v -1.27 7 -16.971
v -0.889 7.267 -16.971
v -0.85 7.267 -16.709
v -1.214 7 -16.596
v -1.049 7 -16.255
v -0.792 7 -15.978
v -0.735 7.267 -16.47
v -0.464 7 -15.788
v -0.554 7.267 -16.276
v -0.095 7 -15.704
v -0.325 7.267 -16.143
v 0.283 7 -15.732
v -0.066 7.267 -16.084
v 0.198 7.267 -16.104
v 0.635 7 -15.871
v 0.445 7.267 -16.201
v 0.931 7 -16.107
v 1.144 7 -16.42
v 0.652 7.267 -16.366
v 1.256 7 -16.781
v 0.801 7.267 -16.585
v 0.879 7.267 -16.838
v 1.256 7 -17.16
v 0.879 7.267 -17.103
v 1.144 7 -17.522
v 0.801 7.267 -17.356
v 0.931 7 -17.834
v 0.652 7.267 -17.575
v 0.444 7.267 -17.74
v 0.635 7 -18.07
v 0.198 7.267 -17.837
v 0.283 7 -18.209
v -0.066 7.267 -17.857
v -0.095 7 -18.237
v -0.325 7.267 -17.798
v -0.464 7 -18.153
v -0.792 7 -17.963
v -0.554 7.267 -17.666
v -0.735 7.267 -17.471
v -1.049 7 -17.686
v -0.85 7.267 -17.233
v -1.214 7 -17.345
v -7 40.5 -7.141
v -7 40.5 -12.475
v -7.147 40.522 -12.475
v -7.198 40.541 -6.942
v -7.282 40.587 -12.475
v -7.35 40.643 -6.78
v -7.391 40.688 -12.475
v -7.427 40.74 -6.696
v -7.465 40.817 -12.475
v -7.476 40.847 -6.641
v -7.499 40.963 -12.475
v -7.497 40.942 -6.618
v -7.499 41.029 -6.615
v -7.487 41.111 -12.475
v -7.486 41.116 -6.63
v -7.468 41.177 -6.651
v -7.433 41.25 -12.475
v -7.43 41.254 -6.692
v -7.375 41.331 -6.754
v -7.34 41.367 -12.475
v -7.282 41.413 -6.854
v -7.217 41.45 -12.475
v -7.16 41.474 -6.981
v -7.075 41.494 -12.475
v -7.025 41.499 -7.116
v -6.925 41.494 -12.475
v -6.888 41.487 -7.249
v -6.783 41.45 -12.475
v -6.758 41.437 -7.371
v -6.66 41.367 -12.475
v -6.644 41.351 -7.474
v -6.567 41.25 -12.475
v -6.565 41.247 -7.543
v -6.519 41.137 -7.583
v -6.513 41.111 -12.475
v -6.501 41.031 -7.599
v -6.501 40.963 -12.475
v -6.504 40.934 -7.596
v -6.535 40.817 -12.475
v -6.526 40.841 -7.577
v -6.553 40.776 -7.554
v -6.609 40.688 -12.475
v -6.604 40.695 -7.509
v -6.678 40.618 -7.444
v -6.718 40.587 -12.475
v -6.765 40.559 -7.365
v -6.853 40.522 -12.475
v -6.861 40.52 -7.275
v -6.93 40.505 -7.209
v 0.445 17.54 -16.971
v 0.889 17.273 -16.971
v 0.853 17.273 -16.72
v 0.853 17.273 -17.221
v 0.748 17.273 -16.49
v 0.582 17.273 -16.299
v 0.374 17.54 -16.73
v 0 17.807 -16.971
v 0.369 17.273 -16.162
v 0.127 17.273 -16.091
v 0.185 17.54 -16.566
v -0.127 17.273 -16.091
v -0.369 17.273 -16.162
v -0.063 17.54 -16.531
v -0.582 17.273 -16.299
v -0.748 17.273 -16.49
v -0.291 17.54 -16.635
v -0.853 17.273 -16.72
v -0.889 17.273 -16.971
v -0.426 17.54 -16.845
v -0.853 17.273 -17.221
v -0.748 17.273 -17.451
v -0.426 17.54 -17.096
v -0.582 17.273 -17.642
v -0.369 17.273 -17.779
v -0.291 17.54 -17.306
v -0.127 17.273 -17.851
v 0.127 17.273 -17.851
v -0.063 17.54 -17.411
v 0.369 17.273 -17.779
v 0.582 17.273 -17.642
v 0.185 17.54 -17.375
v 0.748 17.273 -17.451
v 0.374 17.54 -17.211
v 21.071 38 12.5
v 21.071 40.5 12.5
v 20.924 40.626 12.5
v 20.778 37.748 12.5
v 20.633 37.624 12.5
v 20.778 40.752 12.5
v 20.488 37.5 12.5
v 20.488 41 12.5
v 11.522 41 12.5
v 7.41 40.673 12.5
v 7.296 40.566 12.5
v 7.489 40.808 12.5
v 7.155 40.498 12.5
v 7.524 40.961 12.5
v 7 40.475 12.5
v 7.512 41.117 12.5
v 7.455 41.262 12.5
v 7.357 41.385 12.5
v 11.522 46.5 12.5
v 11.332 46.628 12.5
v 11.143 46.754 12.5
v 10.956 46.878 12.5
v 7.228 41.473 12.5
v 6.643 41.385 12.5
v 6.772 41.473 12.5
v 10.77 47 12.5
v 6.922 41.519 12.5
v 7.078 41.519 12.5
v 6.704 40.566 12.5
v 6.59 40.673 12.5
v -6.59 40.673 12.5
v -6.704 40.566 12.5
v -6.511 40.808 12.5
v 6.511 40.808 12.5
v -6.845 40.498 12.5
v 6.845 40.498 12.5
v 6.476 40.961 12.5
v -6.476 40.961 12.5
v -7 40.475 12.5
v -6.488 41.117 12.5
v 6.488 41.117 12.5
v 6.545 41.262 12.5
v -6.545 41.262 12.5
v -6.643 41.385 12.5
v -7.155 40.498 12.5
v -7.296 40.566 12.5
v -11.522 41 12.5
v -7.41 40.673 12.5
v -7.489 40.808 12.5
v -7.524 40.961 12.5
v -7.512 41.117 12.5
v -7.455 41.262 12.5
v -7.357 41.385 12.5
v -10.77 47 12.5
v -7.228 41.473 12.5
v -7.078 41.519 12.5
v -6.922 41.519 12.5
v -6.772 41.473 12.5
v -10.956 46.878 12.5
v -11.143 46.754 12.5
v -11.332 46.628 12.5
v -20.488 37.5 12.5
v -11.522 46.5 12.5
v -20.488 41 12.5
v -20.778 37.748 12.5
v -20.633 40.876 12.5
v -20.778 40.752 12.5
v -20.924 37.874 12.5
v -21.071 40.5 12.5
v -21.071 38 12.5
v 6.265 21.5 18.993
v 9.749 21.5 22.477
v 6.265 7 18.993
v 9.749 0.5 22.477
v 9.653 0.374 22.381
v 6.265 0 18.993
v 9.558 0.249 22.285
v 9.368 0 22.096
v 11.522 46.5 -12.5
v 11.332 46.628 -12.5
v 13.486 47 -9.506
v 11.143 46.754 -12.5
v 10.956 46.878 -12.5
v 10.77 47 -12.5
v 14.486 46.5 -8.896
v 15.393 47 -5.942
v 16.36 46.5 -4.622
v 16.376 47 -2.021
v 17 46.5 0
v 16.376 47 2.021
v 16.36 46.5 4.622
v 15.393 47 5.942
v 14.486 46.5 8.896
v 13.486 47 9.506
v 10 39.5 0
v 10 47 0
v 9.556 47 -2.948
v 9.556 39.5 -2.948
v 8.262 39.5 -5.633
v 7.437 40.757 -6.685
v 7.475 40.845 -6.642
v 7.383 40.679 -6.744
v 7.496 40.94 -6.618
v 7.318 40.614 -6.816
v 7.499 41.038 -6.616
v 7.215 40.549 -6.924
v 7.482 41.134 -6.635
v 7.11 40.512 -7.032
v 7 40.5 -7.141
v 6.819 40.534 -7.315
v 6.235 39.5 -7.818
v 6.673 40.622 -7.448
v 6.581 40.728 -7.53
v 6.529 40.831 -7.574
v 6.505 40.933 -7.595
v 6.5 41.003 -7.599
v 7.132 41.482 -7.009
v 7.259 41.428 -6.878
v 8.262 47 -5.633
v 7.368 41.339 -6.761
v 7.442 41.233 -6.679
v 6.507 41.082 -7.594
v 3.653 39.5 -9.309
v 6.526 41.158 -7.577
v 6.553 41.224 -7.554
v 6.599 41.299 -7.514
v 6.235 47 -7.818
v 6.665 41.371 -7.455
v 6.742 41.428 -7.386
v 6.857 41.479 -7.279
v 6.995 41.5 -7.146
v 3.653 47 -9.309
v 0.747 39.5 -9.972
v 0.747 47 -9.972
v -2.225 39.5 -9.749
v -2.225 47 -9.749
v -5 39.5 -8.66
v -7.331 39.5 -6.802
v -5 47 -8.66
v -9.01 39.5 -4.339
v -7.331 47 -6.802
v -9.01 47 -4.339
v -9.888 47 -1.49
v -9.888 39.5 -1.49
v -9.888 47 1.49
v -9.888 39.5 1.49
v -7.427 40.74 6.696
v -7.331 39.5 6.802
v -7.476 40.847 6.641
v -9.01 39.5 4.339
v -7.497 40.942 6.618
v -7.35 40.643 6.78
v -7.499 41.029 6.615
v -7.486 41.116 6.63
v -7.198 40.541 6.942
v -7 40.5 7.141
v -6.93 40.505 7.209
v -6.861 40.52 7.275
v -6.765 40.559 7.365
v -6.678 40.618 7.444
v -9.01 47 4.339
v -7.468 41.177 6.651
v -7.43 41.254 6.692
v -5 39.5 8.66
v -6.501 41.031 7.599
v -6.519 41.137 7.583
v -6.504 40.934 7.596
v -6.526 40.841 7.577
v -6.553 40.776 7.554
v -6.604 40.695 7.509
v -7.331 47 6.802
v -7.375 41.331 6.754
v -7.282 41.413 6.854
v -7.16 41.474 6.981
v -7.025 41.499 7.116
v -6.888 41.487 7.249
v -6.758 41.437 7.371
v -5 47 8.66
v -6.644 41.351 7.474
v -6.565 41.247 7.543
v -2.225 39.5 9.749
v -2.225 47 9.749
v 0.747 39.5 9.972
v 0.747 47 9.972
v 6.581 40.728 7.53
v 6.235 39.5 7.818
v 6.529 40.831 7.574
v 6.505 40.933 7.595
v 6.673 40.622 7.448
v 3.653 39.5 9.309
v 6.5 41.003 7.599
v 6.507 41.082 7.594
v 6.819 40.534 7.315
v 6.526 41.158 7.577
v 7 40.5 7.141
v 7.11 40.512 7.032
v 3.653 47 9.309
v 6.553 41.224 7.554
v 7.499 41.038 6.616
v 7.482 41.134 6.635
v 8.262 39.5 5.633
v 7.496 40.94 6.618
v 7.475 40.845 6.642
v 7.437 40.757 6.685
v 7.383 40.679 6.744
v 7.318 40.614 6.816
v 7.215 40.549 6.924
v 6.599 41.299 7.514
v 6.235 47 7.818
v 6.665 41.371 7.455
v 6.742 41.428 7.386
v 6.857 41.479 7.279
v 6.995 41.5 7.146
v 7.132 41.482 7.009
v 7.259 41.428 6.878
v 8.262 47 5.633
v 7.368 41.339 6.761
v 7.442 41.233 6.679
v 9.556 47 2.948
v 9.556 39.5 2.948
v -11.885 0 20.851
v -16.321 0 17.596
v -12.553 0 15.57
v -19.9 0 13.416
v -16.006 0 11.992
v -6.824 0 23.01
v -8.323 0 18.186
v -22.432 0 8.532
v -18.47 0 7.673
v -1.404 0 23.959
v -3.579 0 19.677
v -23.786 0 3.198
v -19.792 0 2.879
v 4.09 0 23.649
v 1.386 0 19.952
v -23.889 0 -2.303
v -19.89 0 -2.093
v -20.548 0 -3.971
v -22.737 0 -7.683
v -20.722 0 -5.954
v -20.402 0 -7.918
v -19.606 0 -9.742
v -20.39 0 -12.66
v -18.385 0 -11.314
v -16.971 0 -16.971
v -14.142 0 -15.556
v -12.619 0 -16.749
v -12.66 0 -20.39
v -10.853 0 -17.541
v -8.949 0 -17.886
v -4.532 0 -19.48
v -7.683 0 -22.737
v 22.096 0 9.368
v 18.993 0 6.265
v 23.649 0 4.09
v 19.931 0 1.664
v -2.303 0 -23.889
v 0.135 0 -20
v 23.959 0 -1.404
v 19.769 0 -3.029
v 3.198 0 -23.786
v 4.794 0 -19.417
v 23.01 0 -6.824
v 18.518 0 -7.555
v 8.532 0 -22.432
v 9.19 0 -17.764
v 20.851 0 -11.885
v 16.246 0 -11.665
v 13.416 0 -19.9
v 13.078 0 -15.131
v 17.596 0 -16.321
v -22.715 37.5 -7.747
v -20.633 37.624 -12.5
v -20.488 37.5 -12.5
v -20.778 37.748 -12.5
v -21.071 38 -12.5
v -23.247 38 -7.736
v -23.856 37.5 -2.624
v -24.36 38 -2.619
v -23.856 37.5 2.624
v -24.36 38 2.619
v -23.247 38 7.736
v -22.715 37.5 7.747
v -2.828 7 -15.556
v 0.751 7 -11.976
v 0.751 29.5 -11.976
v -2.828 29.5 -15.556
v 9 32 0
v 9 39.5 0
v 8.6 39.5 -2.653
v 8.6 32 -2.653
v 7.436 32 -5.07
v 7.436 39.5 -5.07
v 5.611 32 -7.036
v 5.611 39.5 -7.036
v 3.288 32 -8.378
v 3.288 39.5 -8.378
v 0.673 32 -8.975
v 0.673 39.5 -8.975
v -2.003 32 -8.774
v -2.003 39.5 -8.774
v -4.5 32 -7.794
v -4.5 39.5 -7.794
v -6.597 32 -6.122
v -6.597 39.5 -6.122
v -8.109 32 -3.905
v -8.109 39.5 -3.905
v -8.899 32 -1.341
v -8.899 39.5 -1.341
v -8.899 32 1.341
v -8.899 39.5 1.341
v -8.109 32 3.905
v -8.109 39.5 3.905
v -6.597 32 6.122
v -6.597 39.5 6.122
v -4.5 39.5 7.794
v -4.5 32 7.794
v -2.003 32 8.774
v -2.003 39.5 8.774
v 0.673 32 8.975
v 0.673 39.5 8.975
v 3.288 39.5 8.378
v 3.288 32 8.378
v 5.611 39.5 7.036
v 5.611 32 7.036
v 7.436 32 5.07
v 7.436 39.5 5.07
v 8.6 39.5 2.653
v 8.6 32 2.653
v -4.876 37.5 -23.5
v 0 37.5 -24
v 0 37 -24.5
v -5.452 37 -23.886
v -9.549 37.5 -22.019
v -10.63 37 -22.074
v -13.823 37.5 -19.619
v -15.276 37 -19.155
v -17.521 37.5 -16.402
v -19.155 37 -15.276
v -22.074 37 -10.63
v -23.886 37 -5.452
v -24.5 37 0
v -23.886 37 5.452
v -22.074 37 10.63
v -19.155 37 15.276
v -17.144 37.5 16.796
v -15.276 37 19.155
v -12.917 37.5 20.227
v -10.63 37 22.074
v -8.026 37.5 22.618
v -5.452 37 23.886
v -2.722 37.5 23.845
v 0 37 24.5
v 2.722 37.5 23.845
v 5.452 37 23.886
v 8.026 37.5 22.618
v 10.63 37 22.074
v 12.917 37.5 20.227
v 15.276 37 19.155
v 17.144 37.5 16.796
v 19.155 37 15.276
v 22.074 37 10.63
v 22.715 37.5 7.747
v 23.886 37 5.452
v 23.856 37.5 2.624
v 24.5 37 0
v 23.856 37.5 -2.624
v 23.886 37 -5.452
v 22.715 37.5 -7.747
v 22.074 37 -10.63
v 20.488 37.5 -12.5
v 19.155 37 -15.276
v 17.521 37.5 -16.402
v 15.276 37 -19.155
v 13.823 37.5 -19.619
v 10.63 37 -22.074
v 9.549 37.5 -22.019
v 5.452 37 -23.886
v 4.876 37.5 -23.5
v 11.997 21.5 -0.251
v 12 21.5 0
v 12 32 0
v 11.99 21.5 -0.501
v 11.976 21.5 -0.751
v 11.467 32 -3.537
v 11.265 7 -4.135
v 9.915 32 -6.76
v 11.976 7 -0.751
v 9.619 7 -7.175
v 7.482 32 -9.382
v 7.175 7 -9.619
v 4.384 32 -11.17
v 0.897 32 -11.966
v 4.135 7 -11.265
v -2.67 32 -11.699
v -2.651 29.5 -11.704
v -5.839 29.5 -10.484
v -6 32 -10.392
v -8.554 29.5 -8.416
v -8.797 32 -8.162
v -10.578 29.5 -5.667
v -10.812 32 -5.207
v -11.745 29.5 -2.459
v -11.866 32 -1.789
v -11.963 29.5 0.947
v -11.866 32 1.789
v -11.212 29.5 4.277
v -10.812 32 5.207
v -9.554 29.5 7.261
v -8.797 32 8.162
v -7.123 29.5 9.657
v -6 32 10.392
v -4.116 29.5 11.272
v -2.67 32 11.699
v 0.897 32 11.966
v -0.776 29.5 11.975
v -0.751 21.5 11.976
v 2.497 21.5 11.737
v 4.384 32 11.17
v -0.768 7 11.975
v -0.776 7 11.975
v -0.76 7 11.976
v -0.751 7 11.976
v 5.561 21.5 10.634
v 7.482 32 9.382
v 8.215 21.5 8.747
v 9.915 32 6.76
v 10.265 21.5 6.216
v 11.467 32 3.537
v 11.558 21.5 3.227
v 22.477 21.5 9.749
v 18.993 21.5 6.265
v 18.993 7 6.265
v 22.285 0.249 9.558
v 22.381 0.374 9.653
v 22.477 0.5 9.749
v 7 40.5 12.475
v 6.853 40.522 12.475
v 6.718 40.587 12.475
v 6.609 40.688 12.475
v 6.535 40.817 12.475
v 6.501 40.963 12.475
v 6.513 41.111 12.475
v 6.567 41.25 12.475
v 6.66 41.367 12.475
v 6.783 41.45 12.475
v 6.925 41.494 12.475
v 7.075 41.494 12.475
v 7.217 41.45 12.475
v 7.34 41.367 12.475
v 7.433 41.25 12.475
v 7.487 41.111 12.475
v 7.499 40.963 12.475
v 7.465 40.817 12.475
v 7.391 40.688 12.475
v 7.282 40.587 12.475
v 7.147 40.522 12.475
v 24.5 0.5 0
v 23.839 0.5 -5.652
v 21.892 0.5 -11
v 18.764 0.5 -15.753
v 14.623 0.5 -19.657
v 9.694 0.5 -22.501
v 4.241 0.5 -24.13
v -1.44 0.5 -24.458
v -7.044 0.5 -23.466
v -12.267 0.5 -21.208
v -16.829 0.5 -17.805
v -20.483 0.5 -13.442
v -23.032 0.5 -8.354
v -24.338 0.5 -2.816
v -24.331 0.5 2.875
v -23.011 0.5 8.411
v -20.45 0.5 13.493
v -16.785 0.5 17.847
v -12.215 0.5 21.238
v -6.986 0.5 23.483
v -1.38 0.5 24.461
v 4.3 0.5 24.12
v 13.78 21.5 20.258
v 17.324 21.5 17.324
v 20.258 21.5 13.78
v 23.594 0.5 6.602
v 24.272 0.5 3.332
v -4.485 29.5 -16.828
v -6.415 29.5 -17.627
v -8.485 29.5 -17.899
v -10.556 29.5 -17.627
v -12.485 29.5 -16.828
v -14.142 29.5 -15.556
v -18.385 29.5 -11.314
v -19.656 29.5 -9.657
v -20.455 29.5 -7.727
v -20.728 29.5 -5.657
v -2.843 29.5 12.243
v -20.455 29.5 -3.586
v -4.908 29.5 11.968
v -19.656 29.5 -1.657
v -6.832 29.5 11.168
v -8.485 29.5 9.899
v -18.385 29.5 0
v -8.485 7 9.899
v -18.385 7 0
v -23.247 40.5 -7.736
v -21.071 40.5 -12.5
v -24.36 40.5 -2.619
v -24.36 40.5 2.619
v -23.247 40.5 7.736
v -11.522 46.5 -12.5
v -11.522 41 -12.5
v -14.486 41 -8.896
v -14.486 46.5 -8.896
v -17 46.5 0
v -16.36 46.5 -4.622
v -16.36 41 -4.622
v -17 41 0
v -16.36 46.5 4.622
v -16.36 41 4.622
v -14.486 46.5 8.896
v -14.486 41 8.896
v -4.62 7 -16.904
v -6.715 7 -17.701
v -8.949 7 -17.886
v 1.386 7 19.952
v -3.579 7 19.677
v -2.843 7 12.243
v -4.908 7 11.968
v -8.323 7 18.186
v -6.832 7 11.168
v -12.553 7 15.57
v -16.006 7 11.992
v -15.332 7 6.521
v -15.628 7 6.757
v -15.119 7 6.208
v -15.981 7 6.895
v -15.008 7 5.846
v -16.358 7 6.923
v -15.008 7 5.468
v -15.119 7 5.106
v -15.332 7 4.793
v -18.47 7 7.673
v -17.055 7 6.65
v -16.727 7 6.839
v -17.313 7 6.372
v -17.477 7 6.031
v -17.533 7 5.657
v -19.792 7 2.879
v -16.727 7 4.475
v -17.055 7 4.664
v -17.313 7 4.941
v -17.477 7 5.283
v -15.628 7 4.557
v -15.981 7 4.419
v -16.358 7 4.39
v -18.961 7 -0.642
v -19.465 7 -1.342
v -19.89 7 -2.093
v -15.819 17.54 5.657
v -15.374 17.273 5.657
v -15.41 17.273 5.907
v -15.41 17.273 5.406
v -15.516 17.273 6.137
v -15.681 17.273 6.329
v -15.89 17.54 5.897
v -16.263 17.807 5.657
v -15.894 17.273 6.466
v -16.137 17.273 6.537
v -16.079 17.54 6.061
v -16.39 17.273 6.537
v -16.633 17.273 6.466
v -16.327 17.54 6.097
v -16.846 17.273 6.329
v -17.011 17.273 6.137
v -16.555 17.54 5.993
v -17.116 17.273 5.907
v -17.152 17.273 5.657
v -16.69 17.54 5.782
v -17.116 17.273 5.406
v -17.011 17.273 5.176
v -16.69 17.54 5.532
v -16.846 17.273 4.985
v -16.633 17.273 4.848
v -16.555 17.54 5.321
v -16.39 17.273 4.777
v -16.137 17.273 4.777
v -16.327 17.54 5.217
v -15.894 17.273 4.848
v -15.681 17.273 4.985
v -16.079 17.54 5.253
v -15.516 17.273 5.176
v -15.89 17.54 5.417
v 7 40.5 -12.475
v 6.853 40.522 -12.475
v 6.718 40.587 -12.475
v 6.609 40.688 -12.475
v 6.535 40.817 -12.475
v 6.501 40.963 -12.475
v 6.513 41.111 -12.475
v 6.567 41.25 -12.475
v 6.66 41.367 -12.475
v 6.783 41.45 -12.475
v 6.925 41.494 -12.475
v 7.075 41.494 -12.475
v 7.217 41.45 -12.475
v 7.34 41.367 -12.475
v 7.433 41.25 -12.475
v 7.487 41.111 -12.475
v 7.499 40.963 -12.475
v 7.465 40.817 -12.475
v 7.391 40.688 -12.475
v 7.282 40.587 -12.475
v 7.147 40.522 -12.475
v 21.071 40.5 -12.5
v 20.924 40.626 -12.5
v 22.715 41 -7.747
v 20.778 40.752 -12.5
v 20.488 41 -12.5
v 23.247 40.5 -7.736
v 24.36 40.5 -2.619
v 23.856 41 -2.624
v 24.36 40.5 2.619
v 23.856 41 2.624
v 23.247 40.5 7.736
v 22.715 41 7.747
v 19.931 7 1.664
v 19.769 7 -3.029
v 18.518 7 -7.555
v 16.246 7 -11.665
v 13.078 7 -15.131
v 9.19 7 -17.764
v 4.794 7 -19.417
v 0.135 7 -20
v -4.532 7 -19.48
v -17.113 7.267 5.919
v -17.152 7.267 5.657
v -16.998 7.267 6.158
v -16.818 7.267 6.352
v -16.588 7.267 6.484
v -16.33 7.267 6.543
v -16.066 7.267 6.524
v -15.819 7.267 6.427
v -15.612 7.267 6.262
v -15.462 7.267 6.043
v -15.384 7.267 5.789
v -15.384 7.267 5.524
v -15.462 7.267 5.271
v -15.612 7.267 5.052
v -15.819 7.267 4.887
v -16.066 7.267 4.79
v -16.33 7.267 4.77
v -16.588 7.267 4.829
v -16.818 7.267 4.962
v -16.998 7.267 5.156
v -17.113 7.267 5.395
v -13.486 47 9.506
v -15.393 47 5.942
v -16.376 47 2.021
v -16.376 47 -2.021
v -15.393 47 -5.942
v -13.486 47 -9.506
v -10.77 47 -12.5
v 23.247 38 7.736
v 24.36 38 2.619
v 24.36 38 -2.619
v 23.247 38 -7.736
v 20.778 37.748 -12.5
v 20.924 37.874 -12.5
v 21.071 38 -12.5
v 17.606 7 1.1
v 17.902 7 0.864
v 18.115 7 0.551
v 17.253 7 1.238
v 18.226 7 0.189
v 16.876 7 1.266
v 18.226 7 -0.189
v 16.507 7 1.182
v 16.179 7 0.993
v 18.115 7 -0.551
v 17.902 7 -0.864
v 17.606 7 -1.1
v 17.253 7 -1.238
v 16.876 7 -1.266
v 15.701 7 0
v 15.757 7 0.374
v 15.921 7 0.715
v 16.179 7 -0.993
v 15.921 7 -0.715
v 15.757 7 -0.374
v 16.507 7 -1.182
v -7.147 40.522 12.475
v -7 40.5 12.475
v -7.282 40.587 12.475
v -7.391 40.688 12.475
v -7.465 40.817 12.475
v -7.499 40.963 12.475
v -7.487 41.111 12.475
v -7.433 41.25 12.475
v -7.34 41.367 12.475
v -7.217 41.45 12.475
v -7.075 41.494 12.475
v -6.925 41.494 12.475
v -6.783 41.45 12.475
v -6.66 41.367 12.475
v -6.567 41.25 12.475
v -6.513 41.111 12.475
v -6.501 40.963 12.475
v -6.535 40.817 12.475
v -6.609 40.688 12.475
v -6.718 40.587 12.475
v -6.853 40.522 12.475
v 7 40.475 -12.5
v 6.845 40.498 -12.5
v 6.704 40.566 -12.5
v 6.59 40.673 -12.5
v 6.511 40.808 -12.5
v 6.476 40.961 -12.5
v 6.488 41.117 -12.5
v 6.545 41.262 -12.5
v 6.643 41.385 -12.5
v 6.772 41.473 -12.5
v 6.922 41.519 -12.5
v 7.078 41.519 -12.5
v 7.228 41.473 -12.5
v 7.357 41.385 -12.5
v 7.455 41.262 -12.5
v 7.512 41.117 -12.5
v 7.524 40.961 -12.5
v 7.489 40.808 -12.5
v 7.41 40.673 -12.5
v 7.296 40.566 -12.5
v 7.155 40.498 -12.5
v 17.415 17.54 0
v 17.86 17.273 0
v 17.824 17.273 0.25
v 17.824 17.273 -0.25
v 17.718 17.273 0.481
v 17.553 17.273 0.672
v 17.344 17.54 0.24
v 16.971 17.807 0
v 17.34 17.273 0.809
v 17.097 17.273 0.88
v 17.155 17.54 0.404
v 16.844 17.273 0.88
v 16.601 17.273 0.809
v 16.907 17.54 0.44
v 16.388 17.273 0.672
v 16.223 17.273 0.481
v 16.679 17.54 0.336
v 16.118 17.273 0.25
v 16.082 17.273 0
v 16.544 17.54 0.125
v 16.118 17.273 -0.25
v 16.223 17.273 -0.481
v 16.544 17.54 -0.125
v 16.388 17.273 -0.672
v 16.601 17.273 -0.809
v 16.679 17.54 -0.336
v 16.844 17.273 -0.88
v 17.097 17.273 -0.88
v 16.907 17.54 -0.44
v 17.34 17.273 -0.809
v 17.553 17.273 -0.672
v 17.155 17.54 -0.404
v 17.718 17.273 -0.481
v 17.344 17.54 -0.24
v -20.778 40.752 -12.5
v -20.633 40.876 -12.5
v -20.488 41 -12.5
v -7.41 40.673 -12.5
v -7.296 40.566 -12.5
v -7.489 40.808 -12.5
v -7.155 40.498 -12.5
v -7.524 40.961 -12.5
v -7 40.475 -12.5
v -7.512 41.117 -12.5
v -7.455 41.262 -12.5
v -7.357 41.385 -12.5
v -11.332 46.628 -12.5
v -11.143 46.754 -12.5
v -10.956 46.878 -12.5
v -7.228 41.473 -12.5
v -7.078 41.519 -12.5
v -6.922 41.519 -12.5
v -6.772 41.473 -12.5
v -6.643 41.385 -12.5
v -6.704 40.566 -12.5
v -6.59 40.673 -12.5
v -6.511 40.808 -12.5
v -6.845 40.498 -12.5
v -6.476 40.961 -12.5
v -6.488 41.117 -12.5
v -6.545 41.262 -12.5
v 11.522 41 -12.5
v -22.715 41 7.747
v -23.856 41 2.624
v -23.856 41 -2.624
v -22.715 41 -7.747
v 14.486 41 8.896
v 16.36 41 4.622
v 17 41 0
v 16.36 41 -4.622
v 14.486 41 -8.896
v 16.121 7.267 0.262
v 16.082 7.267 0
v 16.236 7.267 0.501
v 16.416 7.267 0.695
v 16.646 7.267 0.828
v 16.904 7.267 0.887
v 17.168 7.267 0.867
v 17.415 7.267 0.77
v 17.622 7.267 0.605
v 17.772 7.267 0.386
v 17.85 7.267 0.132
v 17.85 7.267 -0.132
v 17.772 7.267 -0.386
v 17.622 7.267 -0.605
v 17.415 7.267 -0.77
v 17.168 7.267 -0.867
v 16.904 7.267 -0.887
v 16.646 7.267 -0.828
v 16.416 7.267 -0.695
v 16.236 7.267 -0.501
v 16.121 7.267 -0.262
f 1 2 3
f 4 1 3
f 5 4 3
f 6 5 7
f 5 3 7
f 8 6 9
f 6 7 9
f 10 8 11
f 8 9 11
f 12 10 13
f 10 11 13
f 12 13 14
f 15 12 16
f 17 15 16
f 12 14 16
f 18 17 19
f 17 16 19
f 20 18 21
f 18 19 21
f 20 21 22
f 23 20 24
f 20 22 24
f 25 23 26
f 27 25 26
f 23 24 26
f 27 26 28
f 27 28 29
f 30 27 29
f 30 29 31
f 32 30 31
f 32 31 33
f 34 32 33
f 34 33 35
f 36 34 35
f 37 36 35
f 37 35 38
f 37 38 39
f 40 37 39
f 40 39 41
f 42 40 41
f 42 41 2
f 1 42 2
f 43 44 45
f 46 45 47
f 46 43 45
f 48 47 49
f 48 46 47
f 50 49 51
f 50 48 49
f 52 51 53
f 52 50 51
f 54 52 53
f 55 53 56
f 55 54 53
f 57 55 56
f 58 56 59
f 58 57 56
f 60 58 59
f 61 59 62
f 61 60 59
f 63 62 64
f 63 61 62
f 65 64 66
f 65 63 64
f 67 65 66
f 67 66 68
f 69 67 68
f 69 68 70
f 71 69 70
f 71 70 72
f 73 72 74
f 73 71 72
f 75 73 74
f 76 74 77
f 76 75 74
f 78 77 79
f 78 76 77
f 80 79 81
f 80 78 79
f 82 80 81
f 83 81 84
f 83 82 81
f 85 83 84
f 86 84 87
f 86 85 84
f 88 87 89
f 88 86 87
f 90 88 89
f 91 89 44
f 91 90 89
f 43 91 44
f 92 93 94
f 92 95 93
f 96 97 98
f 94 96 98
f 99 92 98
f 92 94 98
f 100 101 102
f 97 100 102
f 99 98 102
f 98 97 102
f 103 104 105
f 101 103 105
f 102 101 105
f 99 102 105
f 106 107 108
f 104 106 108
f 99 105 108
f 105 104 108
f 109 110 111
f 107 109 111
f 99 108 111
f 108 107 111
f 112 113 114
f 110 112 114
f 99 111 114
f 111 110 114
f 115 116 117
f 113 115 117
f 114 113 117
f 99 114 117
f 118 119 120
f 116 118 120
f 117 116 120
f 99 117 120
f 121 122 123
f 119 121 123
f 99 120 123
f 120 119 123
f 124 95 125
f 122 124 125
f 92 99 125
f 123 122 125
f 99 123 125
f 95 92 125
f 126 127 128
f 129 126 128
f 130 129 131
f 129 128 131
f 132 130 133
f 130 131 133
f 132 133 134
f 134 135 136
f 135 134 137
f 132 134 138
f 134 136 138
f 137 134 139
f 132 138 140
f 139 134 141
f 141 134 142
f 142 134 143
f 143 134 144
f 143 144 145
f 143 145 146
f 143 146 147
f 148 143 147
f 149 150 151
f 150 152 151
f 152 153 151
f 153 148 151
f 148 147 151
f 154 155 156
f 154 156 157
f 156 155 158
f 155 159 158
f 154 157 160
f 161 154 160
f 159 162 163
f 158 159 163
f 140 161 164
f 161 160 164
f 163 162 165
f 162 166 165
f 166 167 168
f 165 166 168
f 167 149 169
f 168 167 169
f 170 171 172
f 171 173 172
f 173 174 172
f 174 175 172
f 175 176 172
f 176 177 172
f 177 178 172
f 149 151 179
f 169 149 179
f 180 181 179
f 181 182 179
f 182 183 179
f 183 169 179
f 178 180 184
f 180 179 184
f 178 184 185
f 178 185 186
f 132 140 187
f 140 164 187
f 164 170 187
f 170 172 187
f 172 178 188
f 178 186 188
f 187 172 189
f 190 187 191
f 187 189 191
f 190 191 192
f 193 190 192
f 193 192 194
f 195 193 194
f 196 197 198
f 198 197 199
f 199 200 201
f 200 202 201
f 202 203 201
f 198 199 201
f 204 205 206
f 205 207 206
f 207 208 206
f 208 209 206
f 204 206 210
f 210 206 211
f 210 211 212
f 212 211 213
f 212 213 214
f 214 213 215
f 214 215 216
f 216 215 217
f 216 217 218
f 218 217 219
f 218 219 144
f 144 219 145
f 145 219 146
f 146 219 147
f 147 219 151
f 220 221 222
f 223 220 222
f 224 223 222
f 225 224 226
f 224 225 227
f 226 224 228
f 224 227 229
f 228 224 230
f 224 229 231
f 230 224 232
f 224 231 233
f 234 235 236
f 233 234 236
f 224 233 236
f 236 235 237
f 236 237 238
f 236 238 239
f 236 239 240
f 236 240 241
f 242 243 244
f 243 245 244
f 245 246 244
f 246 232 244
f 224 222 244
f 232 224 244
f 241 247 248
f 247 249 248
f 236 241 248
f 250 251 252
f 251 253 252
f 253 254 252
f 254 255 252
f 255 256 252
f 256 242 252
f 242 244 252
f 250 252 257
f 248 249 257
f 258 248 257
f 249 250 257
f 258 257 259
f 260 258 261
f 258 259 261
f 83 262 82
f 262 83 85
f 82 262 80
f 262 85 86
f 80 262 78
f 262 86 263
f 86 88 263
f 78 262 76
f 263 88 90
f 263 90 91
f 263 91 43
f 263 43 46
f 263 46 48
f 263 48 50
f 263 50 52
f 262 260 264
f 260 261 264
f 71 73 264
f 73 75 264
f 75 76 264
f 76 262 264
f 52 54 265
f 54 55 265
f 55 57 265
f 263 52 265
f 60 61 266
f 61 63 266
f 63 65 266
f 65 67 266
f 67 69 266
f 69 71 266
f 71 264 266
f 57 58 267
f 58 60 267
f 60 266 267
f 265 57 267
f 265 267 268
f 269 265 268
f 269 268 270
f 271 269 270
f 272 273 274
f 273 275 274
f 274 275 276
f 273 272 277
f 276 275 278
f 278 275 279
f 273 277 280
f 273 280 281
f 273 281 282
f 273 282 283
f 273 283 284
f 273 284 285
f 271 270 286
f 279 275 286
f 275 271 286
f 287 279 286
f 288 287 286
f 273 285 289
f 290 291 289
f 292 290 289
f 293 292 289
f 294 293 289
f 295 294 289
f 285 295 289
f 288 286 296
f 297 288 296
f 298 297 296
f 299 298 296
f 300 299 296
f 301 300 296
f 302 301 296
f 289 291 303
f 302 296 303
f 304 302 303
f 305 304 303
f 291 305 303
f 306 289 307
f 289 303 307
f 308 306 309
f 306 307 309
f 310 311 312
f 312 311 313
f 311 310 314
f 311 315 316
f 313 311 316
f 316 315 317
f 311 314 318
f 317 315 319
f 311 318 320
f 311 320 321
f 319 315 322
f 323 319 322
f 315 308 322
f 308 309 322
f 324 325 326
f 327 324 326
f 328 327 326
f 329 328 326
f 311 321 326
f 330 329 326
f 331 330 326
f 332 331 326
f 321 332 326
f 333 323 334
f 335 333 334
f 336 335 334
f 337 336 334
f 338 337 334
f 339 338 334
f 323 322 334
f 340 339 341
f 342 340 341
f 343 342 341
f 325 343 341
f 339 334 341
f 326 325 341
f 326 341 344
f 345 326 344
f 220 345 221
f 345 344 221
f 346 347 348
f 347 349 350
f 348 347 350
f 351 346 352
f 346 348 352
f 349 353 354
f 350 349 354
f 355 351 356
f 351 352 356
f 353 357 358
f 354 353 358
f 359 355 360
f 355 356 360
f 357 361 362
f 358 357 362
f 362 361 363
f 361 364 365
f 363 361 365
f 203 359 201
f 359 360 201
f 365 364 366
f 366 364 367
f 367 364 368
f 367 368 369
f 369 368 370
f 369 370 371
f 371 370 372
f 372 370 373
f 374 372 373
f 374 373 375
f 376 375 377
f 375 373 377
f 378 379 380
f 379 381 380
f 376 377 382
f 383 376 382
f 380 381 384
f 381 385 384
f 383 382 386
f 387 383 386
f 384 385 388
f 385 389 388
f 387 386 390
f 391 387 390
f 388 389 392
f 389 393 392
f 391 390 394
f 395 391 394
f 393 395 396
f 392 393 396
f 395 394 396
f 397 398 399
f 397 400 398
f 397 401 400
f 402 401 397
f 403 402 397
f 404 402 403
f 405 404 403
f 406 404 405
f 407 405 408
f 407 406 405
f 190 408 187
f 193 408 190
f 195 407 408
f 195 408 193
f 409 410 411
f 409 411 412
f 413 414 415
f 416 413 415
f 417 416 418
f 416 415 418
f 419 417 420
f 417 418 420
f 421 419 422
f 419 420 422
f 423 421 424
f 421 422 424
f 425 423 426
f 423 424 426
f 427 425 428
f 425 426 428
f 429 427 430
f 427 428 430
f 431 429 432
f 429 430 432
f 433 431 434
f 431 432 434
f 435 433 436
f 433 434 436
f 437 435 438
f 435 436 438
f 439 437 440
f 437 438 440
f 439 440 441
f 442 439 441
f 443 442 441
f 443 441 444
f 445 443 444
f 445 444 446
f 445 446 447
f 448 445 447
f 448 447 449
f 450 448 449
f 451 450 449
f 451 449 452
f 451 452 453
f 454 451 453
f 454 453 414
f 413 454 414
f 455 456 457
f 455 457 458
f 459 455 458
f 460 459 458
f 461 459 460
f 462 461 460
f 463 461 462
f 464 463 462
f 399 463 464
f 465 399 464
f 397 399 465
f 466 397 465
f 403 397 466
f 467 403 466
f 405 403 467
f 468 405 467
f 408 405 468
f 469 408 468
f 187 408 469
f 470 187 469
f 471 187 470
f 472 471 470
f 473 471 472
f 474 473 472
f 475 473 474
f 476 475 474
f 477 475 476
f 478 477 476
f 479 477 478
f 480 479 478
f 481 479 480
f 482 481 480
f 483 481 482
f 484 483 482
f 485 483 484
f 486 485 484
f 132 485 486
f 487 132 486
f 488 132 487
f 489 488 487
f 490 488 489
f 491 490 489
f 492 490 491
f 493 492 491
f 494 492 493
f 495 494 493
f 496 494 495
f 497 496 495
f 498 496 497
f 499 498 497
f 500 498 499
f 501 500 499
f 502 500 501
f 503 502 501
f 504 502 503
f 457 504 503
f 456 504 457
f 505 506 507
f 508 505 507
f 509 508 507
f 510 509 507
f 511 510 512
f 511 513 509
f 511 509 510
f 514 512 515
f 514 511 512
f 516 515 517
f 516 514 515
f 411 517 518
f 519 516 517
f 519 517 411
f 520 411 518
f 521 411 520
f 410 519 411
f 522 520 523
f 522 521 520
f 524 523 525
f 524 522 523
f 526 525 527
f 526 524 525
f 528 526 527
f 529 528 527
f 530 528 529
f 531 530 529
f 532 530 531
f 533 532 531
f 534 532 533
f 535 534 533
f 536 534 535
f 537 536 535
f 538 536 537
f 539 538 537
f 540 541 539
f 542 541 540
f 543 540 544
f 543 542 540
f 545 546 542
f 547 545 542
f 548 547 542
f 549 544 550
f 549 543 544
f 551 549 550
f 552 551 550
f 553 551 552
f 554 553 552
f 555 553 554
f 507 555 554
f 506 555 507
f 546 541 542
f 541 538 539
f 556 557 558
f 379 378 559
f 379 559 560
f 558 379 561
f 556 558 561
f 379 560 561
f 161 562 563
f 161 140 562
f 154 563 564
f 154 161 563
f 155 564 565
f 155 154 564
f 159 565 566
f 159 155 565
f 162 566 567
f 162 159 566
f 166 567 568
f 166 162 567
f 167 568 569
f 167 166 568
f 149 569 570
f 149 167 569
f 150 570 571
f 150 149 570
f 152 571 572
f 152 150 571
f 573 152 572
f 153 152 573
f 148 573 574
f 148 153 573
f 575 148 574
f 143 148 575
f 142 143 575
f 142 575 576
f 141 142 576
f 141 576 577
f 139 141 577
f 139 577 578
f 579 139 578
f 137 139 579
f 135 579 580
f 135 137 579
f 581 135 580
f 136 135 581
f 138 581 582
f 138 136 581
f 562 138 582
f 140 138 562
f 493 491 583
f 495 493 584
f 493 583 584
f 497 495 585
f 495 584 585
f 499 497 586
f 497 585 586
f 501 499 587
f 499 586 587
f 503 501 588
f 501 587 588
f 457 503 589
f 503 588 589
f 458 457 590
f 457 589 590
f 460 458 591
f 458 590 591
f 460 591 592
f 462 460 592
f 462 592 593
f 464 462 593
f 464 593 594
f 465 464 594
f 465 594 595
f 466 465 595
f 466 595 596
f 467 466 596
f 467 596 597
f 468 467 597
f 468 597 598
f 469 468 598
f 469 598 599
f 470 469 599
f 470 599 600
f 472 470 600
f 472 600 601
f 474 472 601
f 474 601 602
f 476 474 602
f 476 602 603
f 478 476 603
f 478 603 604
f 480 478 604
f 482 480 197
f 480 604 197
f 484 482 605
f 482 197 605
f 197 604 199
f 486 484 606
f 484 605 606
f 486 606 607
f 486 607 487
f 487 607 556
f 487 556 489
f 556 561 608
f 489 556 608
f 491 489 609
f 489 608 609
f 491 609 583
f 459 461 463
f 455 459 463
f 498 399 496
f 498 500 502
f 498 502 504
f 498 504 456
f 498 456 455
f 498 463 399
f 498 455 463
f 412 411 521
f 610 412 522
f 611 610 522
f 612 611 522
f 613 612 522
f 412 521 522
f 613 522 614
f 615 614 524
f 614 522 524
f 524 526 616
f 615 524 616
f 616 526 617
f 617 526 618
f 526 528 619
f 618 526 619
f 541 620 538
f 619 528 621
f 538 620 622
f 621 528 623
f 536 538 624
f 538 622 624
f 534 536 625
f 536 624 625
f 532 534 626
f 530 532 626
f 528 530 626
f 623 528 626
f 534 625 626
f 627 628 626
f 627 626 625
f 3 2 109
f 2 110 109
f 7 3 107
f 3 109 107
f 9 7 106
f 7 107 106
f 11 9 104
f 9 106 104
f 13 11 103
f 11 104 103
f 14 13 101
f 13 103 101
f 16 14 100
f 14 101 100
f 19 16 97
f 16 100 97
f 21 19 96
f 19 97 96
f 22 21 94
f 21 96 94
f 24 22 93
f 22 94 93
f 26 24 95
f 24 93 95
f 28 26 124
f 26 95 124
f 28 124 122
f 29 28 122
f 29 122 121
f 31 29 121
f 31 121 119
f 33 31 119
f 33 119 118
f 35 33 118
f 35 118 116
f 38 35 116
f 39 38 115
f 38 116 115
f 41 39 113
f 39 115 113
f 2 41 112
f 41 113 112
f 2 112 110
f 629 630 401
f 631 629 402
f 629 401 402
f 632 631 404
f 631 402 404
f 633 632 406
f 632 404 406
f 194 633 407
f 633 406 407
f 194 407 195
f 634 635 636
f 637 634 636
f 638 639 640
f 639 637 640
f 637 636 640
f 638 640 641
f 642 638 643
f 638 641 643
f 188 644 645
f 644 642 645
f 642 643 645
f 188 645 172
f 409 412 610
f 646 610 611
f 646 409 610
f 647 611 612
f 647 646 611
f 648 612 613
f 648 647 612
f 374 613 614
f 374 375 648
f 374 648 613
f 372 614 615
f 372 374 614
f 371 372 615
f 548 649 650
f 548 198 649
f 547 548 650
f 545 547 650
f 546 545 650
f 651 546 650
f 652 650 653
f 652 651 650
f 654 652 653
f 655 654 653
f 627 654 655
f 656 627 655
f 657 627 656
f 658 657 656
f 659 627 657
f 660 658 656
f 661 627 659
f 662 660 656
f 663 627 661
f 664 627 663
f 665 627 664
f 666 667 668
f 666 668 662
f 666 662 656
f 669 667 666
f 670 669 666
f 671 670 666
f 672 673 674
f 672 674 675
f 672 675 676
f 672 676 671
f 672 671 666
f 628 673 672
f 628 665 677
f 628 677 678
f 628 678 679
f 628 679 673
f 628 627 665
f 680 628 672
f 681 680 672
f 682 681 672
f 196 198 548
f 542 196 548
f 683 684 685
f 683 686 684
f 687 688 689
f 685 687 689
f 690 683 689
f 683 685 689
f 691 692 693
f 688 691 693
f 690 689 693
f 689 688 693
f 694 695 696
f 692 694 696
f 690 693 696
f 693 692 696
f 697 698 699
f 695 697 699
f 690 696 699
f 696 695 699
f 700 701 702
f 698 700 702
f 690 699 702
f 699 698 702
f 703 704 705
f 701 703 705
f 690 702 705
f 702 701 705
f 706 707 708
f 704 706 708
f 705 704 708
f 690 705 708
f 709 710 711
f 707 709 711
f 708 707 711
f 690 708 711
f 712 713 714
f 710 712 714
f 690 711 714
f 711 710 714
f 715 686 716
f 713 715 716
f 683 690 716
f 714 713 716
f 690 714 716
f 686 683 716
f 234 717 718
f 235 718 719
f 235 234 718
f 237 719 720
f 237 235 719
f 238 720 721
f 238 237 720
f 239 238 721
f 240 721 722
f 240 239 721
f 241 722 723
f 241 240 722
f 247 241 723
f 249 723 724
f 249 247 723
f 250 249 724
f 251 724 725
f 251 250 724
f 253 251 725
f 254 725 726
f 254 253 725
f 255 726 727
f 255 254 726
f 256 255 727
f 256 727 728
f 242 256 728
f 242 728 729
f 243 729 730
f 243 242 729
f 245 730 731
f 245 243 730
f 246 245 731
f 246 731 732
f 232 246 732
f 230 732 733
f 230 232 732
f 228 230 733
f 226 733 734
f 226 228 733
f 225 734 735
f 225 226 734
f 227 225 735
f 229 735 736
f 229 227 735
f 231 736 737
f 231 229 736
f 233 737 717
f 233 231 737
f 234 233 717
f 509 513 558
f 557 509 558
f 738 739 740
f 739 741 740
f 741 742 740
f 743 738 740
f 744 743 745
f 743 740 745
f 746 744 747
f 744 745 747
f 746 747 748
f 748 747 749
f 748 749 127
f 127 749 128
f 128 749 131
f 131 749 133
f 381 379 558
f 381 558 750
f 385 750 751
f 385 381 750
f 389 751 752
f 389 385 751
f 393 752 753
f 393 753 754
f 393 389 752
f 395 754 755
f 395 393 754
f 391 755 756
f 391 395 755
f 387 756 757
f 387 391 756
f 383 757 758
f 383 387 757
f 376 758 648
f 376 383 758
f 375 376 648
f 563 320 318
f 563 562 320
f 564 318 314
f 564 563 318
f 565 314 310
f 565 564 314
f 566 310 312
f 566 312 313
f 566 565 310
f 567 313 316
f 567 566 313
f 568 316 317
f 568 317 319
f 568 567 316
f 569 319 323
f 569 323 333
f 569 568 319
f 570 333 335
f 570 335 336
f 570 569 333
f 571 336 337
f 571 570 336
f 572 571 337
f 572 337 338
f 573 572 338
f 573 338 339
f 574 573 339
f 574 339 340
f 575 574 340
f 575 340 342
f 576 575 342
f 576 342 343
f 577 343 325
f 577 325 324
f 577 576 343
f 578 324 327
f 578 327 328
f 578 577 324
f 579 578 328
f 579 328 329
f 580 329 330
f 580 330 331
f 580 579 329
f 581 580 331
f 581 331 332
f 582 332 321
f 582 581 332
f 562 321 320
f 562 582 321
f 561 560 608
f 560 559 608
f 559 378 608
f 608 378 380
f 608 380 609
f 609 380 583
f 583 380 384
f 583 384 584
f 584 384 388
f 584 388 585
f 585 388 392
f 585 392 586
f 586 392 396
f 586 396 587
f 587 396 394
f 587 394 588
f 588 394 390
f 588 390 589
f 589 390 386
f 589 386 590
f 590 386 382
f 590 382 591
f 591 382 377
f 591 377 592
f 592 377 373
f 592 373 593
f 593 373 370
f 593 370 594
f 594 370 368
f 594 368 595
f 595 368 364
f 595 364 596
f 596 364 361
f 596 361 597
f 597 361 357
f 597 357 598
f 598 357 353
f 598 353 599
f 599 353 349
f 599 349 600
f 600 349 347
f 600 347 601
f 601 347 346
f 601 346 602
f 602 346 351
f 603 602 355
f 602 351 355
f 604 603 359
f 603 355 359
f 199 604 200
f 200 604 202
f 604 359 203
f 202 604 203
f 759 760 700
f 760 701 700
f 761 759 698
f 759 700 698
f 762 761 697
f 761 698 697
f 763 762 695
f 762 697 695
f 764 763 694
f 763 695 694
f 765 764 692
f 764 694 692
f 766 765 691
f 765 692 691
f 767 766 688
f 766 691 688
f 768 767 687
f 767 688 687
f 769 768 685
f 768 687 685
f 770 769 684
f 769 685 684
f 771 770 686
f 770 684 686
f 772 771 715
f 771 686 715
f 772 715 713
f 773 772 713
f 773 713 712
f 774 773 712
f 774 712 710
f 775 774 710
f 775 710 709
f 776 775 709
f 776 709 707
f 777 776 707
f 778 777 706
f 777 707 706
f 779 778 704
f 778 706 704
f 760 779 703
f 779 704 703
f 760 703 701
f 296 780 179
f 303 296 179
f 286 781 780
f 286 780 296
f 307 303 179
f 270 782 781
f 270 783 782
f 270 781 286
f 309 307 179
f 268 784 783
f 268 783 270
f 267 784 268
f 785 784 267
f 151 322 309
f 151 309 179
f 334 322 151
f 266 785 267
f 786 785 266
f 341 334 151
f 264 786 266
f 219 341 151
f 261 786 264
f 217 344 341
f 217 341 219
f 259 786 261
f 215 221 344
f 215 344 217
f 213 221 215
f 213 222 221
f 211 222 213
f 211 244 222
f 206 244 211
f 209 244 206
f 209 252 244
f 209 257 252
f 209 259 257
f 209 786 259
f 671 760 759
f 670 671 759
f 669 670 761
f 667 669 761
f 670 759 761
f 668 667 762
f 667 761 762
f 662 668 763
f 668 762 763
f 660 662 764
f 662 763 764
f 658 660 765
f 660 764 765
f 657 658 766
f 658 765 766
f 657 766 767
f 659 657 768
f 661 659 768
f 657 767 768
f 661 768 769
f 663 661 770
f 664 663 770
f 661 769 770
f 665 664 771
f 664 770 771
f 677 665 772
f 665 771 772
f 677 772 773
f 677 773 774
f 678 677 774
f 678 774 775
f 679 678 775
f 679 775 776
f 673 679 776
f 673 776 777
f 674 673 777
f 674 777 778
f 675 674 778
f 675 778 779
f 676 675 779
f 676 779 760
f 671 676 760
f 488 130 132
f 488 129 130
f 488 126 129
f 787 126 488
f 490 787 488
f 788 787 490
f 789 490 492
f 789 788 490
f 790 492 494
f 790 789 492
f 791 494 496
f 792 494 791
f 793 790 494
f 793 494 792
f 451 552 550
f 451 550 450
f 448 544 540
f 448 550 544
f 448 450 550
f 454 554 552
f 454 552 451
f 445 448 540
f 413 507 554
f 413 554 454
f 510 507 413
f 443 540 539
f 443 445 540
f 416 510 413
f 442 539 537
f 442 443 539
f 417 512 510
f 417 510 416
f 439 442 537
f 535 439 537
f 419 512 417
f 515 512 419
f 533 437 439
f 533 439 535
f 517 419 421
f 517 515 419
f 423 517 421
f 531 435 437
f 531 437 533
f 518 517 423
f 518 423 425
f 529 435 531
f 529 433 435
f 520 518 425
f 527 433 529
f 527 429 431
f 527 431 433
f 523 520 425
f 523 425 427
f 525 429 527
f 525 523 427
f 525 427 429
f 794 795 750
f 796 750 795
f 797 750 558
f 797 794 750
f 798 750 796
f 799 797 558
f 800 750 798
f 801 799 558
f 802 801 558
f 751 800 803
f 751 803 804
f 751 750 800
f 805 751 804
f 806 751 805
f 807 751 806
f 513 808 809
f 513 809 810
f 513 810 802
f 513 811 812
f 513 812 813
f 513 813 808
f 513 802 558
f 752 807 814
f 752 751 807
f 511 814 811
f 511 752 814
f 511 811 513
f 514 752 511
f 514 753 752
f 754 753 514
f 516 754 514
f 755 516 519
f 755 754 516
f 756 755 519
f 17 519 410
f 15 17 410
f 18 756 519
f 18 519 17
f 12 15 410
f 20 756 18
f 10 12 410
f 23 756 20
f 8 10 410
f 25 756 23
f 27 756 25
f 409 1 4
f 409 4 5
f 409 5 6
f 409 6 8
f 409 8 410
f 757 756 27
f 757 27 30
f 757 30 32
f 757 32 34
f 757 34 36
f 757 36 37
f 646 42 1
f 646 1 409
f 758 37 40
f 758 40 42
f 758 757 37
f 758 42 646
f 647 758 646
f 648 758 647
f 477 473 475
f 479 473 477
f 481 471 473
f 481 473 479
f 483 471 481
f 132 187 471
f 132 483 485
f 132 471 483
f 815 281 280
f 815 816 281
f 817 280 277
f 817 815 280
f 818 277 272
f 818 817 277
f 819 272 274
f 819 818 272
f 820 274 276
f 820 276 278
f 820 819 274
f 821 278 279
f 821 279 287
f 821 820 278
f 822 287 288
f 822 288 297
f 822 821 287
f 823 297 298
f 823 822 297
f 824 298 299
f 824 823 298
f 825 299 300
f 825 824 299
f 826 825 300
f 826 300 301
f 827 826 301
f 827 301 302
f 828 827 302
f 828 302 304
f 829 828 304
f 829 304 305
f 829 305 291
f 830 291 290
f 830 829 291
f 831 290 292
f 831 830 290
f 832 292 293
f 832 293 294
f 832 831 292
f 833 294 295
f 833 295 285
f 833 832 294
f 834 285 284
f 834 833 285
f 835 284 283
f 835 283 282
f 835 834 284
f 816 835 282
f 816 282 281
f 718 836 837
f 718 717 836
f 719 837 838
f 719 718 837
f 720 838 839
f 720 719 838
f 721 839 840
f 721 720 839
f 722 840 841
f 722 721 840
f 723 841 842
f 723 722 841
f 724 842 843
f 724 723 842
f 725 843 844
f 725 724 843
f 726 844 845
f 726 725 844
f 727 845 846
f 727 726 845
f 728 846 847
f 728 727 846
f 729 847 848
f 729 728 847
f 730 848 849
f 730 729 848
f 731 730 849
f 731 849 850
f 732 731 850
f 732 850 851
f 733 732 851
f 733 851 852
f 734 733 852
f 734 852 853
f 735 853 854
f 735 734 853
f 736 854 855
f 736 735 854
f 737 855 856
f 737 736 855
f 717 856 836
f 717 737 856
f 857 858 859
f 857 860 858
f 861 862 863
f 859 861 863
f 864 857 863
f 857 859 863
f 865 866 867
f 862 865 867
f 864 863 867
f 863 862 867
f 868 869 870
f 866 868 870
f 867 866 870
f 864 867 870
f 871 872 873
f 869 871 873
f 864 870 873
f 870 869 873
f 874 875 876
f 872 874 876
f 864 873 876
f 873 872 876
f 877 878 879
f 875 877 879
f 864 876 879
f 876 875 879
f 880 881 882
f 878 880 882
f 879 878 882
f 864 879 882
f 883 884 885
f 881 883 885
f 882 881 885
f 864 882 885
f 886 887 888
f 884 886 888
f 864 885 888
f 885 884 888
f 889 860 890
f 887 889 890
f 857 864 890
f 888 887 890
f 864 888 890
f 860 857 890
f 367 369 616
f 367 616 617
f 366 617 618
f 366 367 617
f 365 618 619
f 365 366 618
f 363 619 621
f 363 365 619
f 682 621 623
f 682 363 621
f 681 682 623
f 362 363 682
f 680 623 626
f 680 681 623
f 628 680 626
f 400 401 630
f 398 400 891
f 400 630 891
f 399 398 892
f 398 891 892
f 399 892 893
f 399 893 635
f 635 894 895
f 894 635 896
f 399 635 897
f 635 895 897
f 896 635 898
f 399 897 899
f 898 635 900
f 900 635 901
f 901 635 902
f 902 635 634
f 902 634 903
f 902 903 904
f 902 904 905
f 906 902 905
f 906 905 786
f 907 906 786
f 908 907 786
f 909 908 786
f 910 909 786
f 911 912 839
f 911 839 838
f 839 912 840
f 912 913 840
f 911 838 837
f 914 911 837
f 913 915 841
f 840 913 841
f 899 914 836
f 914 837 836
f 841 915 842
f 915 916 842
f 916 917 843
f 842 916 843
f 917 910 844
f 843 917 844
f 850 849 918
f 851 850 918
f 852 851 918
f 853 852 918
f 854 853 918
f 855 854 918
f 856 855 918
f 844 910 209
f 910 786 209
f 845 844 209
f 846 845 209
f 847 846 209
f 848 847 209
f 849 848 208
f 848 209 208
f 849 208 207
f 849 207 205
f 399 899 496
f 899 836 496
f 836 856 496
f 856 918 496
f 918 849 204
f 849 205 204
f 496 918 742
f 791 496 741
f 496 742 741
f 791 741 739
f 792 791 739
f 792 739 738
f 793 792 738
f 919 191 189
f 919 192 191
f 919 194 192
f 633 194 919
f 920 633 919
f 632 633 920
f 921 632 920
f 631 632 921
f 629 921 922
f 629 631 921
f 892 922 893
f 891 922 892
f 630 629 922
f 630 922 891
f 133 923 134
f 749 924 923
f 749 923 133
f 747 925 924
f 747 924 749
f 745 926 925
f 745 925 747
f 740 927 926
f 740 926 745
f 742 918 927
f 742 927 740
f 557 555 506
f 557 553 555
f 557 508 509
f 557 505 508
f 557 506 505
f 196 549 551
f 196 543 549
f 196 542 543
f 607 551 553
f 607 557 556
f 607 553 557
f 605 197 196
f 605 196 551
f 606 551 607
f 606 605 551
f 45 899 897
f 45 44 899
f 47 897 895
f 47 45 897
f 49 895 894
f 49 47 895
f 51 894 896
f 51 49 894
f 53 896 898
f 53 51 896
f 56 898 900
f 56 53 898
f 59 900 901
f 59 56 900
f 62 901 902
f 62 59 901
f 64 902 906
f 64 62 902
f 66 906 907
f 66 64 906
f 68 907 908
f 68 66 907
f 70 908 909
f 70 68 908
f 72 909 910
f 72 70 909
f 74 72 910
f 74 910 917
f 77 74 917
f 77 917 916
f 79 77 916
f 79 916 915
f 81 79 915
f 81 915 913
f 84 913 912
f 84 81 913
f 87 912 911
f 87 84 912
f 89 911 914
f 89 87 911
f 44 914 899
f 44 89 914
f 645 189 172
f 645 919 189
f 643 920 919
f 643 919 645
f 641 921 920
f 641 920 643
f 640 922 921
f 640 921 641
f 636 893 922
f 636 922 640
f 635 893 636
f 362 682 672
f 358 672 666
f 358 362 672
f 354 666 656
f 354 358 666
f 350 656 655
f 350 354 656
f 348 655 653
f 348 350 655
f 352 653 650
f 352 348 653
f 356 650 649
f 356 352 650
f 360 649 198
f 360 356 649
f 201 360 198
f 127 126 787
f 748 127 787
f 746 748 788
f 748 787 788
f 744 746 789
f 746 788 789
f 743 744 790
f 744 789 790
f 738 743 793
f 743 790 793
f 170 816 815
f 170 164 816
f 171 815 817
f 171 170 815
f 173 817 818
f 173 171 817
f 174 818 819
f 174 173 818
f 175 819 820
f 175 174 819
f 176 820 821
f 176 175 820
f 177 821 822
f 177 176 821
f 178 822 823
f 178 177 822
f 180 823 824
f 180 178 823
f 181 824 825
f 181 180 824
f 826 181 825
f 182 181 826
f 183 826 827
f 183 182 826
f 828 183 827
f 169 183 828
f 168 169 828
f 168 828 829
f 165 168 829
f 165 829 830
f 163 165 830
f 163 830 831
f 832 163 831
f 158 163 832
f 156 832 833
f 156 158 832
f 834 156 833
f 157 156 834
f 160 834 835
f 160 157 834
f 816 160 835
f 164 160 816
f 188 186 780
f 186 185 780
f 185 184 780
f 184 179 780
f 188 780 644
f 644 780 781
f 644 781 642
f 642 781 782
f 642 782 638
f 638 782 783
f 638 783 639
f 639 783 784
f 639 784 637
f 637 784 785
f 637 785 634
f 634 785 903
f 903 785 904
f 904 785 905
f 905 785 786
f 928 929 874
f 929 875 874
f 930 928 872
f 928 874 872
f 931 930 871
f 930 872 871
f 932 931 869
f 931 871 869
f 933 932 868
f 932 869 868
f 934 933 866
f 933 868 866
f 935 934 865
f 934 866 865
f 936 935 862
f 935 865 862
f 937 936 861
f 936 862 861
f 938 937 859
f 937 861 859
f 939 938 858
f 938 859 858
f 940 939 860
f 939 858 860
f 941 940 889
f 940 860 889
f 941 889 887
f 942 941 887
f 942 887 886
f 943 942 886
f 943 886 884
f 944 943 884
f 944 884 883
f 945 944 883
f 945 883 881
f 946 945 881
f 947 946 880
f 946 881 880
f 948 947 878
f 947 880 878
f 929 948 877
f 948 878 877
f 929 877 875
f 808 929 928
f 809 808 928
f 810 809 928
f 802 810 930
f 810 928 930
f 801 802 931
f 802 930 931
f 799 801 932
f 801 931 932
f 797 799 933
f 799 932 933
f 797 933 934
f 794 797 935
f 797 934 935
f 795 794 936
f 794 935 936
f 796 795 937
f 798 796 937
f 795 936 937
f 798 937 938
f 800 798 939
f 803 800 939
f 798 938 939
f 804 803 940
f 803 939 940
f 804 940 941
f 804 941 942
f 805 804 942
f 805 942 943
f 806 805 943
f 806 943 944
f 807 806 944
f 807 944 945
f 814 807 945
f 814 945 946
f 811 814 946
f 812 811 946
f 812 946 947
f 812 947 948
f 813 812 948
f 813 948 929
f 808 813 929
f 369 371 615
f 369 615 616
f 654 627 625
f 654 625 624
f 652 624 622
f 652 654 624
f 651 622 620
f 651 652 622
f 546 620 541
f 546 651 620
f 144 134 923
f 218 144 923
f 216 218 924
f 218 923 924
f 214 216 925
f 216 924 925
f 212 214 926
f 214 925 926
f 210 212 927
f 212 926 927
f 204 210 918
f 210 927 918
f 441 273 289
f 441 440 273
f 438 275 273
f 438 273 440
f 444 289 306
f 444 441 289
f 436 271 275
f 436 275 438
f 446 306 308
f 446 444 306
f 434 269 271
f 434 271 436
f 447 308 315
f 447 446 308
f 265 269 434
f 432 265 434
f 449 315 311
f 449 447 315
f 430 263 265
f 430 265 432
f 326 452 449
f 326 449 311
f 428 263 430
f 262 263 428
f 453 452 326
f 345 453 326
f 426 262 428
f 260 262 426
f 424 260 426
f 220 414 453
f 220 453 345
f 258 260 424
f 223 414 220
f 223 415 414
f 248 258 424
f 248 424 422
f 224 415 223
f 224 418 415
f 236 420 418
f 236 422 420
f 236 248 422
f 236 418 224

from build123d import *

# Parameters (mm, degrees)
SKETCH_1_R                     = 24.5
EXTRUDE_1_DEPTH                = 47
CUT_EXTRUDE_2_DEPTH            = 9.5
SKETCH_4_R                     = 10
CUT_EXTRUDE_4_DEPTH            = 7.5
CUT_EXTRUDE_START              = 3.5
SKETCH_5_OUTSIDE_W             = 67.746
SKETCH_5_OUTSIDE_H             = 67.746
SKETCH_5_OUTSIDE_R             = 17
CUT_EXTRUDE_5_DEPTH            = 7
SKETCH_6_R                     = 9
CUT_EXTRUDE_6_DEPTH            = 40.5
CUT_EXTRUDE_10_DEPTH           = 29.5
CUT_EXTRUDE_11_DEPTH           = 21.5
HOLE_WIZARD_2_561_D            = 1.778
HOLE_WIZARD_2_561_DEPTH        = 10.2733
HOLE_WIZARD_2_561_CSINK_D      = 2.54
HOLE_WIZARD_2_561_CSINK_ANGLE  = 110
HOLE_WIZARD_2_561_TIP          = 0.53416509
HOLE_WIZARD_1_0_1_1_AT_2_COUNT = 2
HOLE_WIZARD_1_0_1_1_AT_2_PITCH = 14
CHAMFER_1_SIZE                 = 0.5


with BuildPart() as part:
    # Эскиз1 → Бобышка-Вытянуть1 (new body)
    with BuildSketch(Plane(origin=(0, 0, 0), x_dir=(1, 0, 0), z_dir=(0, 1, 0))):
        Circle(SKETCH_1_R)
    extrude(amount=EXTRUDE_1_DEPTH)

    # Эскиз2 → Вырез-Вытянуть2 (cut)
    with BuildSketch(Plane(origin=(0, 47, 0), x_dir=(1, 0, 0), z_dir=(0, 1, 0))):
        with BuildLine():
            ThreePointArc((21.071307506, 12.5), (0, 24.5), (-21.071307506, 12.5))
            Line((-21.071307506, 12.5), (21.071307506, 12.5))
        make_face()
        with BuildLine():
            Line((21.071307506, -12.5), (-21.071307506, -12.5))
            ThreePointArc((-21.071307506, -12.5), (0, -24.5), (21.071307506, -12.5))
        make_face()
    extrude(amount=-CUT_EXTRUDE_2_DEPTH, mode=Mode.SUBTRACT)

    # Эскиз4 → Вырез-Вытянуть4 (cut)
    with BuildSketch(Plane(origin=(0, 47, 0), x_dir=(1, 0, 0), z_dir=(0, 1, 0))):
        Circle(SKETCH_4_R)
    extrude(amount=-CUT_EXTRUDE_4_DEPTH, mode=Mode.SUBTRACT)

    # Эскиз5 outside → Вырез-Вытянуть5 (cut, through all)
    with BuildSketch(Plane(origin=(0, 37.5, 0), x_dir=(1, 0, 0), z_dir=(0, 1, 0)).offset(CUT_EXTRUDE_START)):
        Rectangle(SKETCH_5_OUTSIDE_W, SKETCH_5_OUTSIDE_H)
        Circle(SKETCH_5_OUTSIDE_R, mode=Mode.SUBTRACT)
    extrude(amount=CUT_EXTRUDE_5_DEPTH, mode=Mode.SUBTRACT)

    # Эскиз6 → Вырез-Вытянуть6 (cut, through all)
    with BuildSketch(Plane(origin=(0, 39.5, 0), x_dir=(1, 0, 0), z_dir=(0, 1, 0))):
        Circle(SKETCH_6_R)
    extrude(amount=-CUT_EXTRUDE_6_DEPTH, mode=Mode.SUBTRACT)

    # Эскиз7 → Вырез-Повернуть1 (revolve, cut)
    with BuildSketch(Plane.XY):
        Polygon((0, 32), (12, 32), (12, 7), (20, 7), (20, 0), (0, 0), align=None)
    revolve(axis=Axis((0, 0, 0), (0, 1, 0)), mode=Mode.SUBTRACT)

    # Эскиз13 → Вырез-Вытянуть10 (cut)
    with BuildSketch(Plane.XZ):
        with BuildLine():
            Line((2.828427125, 9.899494937), (7.071067812, 5.656854249))
            ThreePointArc((7.071067812, 5.656854249), (9.414213562, 0), (7.071067812, -5.656854249))
            Line((7.071067812, -5.656854249), (-2.828427125, -15.556349186))
            ThreePointArc((-2.828427125, -15.556349186), (-8.485281374, -17.899494937), (-14.142135624, -15.556349186))
            Line((-14.142135624, -15.556349186), (-18.384776311, -11.313708499))
            ThreePointArc((-18.384776311, -11.313708499), (-20.727922061, -5.656854249), (-18.384776311, 0))
            Line((-18.384776311, 0), (-8.485281374, 9.899494937))
            ThreePointArc((-8.485281374, 9.899494937), (-2.828427125, 12.242640687), (2.828427125, 9.899494937))
        make_face()
    extrude(amount=-CUT_EXTRUDE_10_DEPTH, mode=Mode.SUBTRACT)

    # Эскиз14 → Вырез-Вытянуть11 (cut)
    with BuildSketch(Plane.XZ):
        with BuildLine():
            Line((9.748922014, 22.476844075), (6.26536991, 18.993291971))
            ThreePointArc((6.26536991, 18.993291971), (14.142135624, 14.142135624), (18.993291971, 6.26536991))
            Line((18.993291971, 6.26536991), (22.476844075, 9.748922014))
            ThreePointArc((22.476844075, 9.748922014), (17.324116139, 17.324116139), (9.748922014, 22.476844075))
        make_face()
        with BuildLine():
            Line((6.26536991, 18.993291971), (-6.363961031, 6.363961031))
            Line((-6.363961031, 6.363961031), (6.363961031, -6.363961031))
            Line((6.363961031, -6.363961031), (18.993291971, 6.26536991))
            ThreePointArc((18.993291971, 6.26536991), (14.142135624, 14.142135624), (6.26536991, 18.993291971))
        make_face()
    extrude(amount=-CUT_EXTRUDE_11_DEPTH, mode=Mode.SUBTRACT)

    # Отверстие обработанное метчиком #2-561
    with Locations(Plane.XZ.offset(-7)):
        with Locations((0, -16.970562748), (16.970562748, 0), (-16.263455967, 5.656854249)):
            CounterSinkHole(HOLE_WIZARD_2_561_D / 2, HOLE_WIZARD_2_561_CSINK_D / 2, depth=HOLE_WIZARD_2_561_DEPTH, counter_sink_angle=HOLE_WIZARD_2_561_CSINK_ANGLE)
            with Locations((0, 0, -(HOLE_WIZARD_2_561_DEPTH + HOLE_WIZARD_2_561_TIP / 2))):  # 118° drill point
                Cone(0, HOLE_WIZARD_2_561_D / 2, HOLE_WIZARD_2_561_TIP, mode=Mode.SUBTRACT)

    # Эскиз23 → Диаметр отверстия Ø1.0 (1)1 (revolve, cut)
    with BuildSketch(Plane(origin=(-7, 41, 12.5), x_dir=(0, -1, 0), z_dir=(1, 0, 0))):
        Polygon((0, 0), (0, 25), (0.525, 25), (0.5, 24.975), (0.5, 0.025), (0.525, 0), align=None)
    hole_wizard_1_0_1_1 = revolve(axis=Axis((-7, 41, 18.85), (0, 0, -1)), mode=Mode.SUBTRACT)

    # Диаметр отверстия Ø1.0 (1)1 at 2: Диаметр отверстия Ø1.0 (1)1 ×2
    with Locations(*[(i * HOLE_WIZARD_1_0_1_1_AT_2_PITCH, 0, 0) for i in range(1, HOLE_WIZARD_1_0_1_1_AT_2_COUNT)]):
        add(hole_wizard_1_0_1_1, mode=Mode.SUBTRACT)

    # Эскиз24 → Вырез-Повернуть2 (revolve, cut)
    with BuildSketch(Plane(origin=(0, 0, 0), x_dir=(0, 0, -1), z_dir=(1, 0, 0))):
        Polygon((24.5, 37.000075506), (24.000075506, 37.5), (24.5, 37.999924494), align=None)
    revolve(axis=Axis((0, 0, 0), (0, 1, 0)), mode=Mode.SUBTRACT)

    # Фаска1
    chamfer_1_edges = [part.edges().sort_by_distance(p)[0] for p in [
        (-20.482902496, 0, -13.442496246),
        (-17, 47, 0),
        (17, 47, 0),
        (-24.5, 41, 0),
        (24.5, 41, 0),
    ]]
    chamfer(chamfer_1_edges, length=CHAMFER_1_SIZE)


solid = part.part
